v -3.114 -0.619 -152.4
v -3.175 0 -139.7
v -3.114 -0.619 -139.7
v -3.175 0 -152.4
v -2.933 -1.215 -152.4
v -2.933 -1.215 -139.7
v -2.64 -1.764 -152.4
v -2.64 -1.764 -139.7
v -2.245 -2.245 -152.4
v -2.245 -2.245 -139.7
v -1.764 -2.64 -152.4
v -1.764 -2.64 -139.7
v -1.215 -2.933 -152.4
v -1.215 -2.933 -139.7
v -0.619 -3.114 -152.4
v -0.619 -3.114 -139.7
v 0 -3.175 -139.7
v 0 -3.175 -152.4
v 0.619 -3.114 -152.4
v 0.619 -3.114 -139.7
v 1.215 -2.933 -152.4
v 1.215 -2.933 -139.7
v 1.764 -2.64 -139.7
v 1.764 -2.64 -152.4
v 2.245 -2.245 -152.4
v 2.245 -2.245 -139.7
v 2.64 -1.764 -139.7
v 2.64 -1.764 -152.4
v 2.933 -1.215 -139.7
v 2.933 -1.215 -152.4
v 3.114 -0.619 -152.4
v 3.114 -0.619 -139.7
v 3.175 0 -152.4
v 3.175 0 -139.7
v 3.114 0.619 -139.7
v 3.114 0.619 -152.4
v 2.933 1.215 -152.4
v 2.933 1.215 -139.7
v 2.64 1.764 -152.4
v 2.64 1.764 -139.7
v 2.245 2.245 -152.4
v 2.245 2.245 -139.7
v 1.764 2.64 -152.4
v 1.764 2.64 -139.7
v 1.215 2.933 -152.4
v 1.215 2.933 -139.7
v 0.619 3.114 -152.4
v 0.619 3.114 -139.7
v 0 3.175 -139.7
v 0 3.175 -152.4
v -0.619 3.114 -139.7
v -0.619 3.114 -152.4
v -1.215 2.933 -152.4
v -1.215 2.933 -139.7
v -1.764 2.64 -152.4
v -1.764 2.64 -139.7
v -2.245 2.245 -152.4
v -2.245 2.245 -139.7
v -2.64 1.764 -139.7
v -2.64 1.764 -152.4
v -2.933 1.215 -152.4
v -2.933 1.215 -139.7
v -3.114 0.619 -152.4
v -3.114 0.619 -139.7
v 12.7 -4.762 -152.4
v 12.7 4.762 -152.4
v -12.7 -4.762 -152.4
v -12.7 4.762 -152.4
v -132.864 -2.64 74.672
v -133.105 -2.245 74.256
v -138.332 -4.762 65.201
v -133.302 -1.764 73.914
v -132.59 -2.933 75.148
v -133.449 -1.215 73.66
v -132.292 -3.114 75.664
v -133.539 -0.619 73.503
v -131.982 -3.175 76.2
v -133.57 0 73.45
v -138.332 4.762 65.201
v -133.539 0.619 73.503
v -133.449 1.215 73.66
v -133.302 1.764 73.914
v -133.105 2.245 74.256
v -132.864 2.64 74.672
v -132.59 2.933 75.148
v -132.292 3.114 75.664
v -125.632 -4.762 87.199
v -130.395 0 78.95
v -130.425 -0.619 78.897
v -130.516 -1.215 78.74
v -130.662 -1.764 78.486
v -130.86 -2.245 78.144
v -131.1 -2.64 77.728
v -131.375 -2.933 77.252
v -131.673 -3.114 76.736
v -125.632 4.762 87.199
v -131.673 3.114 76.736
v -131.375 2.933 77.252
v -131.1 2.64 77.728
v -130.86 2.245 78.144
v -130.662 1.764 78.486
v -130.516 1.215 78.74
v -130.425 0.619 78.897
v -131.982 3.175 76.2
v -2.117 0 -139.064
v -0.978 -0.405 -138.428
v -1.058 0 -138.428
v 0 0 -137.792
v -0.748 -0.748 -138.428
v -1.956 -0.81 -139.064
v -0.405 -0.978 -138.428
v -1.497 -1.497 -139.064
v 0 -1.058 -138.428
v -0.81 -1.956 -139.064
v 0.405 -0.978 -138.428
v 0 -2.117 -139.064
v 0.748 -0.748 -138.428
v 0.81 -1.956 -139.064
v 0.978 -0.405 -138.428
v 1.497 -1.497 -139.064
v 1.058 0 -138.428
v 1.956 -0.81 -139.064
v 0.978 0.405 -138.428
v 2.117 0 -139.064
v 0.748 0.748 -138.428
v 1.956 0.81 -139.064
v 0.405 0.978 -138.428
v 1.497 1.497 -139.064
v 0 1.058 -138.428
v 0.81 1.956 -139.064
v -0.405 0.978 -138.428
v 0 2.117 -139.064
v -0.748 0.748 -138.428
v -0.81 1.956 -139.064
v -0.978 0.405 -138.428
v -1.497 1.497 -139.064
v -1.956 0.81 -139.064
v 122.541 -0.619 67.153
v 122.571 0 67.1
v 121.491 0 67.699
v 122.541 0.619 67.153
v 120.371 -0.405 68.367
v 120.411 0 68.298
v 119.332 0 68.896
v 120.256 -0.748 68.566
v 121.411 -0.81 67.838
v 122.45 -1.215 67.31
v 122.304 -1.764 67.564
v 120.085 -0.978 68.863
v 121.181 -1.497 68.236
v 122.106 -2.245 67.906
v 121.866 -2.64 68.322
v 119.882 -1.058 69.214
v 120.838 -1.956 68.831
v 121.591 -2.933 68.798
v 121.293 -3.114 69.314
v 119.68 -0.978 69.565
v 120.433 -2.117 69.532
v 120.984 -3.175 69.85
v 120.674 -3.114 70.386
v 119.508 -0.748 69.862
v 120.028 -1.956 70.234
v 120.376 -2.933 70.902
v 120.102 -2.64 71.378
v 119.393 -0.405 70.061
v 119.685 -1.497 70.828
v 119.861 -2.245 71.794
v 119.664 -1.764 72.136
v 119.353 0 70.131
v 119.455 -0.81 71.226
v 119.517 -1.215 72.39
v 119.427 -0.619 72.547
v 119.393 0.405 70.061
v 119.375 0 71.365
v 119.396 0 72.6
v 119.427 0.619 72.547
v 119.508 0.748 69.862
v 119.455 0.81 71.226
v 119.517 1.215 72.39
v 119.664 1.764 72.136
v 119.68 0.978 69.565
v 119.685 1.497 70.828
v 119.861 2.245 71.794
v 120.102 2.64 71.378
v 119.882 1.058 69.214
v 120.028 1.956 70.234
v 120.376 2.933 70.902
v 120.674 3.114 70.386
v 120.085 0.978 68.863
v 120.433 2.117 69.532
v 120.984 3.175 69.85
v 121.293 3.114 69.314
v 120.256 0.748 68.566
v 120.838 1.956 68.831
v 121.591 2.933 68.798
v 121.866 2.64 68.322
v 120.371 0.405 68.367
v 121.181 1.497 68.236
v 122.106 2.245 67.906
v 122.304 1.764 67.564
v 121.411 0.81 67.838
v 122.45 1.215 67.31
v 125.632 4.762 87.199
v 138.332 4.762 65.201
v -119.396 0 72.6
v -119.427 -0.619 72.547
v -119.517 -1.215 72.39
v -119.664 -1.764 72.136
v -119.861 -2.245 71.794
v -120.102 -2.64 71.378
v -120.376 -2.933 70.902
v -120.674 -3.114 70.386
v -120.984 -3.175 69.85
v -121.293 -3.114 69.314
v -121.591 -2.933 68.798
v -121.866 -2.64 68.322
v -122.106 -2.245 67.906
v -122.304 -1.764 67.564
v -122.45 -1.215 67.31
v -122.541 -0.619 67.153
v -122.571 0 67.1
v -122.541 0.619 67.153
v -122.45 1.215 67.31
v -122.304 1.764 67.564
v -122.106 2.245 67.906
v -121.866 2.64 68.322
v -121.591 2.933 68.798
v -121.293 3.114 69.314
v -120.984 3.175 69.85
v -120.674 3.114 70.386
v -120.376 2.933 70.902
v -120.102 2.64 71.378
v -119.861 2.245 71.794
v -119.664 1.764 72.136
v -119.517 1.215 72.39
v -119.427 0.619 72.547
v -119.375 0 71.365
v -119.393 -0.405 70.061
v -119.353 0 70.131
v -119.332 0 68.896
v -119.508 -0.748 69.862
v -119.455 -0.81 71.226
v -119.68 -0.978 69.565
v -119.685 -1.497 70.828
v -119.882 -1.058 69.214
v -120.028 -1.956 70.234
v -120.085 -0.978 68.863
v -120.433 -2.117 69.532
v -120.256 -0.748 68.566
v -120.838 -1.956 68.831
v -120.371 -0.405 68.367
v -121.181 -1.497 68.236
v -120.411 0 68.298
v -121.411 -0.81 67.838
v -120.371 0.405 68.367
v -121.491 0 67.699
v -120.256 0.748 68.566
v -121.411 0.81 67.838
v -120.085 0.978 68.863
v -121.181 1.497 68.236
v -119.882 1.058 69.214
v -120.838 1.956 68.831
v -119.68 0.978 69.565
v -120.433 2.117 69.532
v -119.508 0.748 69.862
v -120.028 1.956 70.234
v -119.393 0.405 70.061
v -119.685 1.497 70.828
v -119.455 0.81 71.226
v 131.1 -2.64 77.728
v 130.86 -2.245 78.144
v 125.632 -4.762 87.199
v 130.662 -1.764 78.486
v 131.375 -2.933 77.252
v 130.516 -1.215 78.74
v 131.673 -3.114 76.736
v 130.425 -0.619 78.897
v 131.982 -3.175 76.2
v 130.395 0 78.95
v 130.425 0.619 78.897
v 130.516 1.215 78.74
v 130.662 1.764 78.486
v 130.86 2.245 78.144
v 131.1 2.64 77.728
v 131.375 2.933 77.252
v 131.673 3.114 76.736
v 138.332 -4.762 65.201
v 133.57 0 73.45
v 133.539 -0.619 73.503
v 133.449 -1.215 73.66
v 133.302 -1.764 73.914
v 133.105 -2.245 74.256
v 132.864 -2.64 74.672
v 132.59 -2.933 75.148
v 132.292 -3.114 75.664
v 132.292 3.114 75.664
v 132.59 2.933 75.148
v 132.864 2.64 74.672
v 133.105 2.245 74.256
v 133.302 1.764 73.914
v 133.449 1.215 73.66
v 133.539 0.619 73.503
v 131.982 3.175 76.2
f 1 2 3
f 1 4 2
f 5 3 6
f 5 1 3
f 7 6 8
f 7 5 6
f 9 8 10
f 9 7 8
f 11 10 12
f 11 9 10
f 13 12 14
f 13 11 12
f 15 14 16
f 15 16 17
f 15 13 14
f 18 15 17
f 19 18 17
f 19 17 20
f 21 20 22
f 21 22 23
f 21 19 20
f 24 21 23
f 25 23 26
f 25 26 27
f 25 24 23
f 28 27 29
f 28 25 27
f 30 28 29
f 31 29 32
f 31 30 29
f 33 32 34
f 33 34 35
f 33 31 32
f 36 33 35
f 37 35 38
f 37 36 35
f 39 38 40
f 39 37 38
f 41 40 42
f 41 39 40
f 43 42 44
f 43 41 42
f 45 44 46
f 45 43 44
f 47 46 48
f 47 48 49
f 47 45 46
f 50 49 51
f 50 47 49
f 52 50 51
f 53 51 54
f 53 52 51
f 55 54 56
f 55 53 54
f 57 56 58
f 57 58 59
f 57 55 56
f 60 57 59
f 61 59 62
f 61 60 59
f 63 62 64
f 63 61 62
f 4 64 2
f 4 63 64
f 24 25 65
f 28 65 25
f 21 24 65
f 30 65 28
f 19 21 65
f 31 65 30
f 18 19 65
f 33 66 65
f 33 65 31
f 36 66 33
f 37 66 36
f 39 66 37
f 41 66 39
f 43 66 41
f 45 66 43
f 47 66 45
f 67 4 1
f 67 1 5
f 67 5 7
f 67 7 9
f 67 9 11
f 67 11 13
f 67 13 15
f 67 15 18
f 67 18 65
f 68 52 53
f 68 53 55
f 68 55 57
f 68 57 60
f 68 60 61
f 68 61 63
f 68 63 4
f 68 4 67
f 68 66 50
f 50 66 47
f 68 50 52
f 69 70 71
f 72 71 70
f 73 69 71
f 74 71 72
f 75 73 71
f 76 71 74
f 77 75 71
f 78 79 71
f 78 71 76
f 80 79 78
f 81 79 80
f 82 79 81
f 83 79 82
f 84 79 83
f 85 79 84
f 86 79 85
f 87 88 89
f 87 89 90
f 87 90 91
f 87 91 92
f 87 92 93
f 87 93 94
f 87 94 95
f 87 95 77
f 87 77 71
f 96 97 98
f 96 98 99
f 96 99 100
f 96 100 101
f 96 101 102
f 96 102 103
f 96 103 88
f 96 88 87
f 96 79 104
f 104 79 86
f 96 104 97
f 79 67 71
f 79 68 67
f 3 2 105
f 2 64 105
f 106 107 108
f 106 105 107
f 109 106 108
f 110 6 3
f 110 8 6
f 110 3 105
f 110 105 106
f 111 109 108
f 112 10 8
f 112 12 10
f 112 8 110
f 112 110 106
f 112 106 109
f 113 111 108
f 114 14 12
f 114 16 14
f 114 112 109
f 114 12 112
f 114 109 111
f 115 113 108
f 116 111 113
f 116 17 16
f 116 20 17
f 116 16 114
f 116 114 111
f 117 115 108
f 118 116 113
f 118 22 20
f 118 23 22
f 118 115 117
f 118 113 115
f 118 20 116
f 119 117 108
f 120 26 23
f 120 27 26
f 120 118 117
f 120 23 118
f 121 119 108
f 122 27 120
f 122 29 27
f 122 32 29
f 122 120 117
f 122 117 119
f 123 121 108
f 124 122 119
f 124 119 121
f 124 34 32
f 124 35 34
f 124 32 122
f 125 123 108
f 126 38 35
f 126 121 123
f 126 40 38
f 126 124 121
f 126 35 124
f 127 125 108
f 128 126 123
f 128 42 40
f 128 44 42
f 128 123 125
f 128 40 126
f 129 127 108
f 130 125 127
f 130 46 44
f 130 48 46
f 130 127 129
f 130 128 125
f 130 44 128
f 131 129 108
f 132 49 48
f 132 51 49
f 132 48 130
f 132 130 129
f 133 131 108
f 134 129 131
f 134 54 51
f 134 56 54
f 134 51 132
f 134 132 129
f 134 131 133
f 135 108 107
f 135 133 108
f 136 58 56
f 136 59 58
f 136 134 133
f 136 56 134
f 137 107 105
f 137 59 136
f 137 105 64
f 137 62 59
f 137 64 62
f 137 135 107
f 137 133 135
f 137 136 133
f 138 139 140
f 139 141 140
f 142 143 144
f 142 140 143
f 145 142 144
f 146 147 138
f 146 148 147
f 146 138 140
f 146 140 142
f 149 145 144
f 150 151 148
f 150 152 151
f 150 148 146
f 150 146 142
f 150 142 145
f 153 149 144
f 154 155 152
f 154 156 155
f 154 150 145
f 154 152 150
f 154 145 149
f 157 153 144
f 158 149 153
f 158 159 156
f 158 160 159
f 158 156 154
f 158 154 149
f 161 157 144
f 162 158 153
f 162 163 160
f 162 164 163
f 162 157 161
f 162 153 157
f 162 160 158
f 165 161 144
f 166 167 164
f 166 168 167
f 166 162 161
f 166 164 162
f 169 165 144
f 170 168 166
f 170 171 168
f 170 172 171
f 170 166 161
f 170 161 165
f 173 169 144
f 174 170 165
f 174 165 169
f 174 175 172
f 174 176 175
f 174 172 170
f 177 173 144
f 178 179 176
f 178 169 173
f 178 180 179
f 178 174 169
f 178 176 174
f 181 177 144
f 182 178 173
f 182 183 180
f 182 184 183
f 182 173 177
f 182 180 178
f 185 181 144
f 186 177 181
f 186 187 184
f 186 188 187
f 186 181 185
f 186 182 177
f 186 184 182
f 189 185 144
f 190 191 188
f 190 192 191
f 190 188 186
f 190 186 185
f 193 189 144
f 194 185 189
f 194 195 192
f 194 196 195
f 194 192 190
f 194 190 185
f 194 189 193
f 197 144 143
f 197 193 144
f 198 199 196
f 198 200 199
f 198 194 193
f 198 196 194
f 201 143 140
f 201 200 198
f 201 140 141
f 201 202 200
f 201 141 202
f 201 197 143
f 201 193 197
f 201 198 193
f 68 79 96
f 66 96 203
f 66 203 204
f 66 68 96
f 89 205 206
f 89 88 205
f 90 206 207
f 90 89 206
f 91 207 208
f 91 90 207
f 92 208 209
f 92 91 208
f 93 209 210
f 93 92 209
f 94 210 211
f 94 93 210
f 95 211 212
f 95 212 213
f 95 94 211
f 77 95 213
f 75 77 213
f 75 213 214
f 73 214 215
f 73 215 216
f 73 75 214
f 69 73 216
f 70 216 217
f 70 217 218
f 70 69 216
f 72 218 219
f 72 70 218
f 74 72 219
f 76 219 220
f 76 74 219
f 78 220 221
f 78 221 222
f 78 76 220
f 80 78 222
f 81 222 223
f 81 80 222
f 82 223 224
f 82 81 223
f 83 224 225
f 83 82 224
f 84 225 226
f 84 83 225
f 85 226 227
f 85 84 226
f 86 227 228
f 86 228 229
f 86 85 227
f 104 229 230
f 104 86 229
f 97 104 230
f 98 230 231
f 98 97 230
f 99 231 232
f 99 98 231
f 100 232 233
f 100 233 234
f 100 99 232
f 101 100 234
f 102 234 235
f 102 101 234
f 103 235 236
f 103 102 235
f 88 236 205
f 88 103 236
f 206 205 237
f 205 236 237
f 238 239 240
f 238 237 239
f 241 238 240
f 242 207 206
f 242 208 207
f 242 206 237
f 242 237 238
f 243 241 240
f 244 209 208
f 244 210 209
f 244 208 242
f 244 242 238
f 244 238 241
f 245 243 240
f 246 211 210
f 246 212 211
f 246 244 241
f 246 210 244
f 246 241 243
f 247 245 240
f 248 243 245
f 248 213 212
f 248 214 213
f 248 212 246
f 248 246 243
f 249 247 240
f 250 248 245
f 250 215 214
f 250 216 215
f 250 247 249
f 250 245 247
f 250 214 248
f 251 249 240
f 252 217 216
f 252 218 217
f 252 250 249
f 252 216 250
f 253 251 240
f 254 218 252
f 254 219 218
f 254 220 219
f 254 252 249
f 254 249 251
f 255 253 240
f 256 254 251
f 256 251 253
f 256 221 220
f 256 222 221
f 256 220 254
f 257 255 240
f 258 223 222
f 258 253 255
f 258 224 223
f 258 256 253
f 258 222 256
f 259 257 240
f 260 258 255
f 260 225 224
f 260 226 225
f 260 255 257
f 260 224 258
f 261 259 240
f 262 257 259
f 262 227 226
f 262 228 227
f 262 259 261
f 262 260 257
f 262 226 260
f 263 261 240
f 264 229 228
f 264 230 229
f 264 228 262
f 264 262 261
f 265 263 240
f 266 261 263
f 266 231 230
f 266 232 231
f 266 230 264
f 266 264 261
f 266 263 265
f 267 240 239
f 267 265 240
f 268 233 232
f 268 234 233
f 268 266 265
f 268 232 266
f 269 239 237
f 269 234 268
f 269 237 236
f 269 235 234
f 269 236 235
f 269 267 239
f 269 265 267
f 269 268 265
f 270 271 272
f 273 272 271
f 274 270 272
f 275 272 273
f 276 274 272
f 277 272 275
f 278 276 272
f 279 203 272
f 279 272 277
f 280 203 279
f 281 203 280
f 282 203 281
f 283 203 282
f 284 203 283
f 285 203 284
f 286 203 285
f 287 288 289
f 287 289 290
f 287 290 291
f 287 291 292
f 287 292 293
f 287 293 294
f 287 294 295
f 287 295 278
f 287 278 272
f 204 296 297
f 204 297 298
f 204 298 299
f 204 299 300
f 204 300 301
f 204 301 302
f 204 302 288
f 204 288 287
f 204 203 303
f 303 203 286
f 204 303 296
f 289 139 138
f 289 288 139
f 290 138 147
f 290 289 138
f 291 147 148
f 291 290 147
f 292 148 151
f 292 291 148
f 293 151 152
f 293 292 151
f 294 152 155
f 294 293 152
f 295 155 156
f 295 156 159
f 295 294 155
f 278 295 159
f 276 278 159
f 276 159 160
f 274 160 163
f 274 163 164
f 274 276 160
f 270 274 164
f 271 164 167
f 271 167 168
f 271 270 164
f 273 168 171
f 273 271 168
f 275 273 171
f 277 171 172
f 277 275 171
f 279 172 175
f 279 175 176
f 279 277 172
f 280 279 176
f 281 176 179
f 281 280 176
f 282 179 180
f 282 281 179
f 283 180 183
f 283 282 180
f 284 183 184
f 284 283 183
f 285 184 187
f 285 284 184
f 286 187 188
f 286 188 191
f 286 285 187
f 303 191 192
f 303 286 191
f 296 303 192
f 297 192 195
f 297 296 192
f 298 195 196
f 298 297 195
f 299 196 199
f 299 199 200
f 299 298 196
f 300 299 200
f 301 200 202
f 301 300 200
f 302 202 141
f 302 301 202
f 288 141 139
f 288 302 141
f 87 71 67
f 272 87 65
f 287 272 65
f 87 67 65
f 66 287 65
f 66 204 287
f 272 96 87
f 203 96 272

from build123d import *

# Parameters (mm, degrees)
BOSS_EXTRUDE1_DEPTH = 4.7625
CIRPATTERN1_COUNT   = 3


with BuildPart() as part:
    # Sketch1 → Boss-Extrude1 (new, symmetric)
    with BuildSketch(Plane(origin=(0, 0, 0), x_dir=(1, 0, 0), z_dir=(0, 1, 0))):
        Polygon((-12.7, 152.4), (-138.332271537, -65.201477372), (-125.632271537, -87.198522628), (125.632271537, -87.198522628), (138.332271537, -65.201477372), (12.7, 152.4), align=None)
    extrude(amount=BOSS_EXTRUDE1_DEPTH, both=True)

    # Sketch4 → 1/4 (0.25) Diameter Hole1 (revolve, cut)
    with BuildSketch(Plane(origin=(131.982271537, 0, 76.2), x_dir=(0.49999999999999806, 0, -0.8660254037844398), z_dir=(0, 1, 0))):
        Polygon((0, 0), (0, 14.607732465), (3.175, 12.7), (3.175, 0), align=None)
    f_1_4_0_25_diameter_hole1 = revolve(axis=Axis((137.481532851, 0, 79.375), (-0.8660254037844398, 0, -0.49999999999999806)), mode=Mode.SUBTRACT)

    # CirPattern1: 1/4 (0.25) Diameter Hole1 ×3 about axis
    cirpattern1_axis = Axis((0, 4.7625, 0), (0, 1, 0))
    for i in range(1, CIRPATTERN1_COUNT):
        add(f_1_4_0_25_diameter_hole1.rotate(cirpattern1_axis, i * 360 / CIRPATTERN1_COUNT), mode=Mode.SUBTRACT)


solid = part.part
